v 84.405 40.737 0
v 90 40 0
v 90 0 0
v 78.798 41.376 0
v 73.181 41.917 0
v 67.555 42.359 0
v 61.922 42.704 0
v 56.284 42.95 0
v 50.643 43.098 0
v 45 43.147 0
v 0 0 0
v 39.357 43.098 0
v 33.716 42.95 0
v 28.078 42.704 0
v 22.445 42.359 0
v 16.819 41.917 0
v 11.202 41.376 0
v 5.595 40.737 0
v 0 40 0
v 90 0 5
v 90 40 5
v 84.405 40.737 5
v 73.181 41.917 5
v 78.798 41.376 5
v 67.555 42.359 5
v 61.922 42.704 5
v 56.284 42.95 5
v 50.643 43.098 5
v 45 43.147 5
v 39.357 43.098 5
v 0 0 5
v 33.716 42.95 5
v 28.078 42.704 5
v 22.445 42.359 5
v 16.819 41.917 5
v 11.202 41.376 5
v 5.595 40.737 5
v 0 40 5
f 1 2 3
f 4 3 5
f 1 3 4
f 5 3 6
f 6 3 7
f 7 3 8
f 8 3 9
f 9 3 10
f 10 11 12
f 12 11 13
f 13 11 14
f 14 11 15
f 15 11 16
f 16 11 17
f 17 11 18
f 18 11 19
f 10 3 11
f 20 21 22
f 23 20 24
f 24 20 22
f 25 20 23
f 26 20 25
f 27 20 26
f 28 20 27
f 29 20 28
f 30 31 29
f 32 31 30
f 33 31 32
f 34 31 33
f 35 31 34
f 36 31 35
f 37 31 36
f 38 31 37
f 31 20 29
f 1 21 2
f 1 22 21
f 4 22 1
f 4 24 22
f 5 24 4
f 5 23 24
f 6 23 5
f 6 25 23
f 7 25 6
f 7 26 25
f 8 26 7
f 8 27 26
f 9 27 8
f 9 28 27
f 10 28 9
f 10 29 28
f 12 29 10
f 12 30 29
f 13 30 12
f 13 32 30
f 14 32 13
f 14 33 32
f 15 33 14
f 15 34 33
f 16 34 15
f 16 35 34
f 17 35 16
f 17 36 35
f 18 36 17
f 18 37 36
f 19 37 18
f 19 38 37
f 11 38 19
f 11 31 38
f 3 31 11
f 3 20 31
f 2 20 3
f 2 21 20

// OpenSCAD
$fn = 32;

// ----------------------------------------------------------------------
// Arc profile plate: crown, 19 points
// ----------------------------------------------------------------------

// --- parameters (mm) ---
bar_l = 90;               // bar length, X
bar_w = 40;               // bar height at the ends, Y
arc_r = 323.34;           // radius of the crown arc
arc_angle = 16;           // crown arc angle, degrees
crown_rise = 3.15;        // rise of the crown over the ends
arc_step = 1;             // sampling step of the crown arc, degrees
plate_t = 5;              // plate thickness, Z
fit_tol = 0.1;            // declared fit tolerance (prompt contract)
free_tol = 0.3;           // declared free tolerance (prompt contract)

bbox_y = bar_w + crown_rise;  // full height with the crown

profile = [[90, 40], [84.405, 40.737], [78.798, 41.376], [73.181, 41.917], [67.555, 42.359], [61.922, 42.704], [56.284, 42.95], [50.643, 43.098], [45, 43.147], [39.357, 43.098], [33.716, 42.95], [28.078, 42.704], [22.445, 42.359], [16.819, 41.917], [11.202, 41.376], [5.595, 40.737], [0, 40], [0, 0], [90, 0]];  // primary outline, 19 points, counter clockwise

// --- the one profile operation ---
linear_extrude(height = plate_t) polygon(points = profile);
